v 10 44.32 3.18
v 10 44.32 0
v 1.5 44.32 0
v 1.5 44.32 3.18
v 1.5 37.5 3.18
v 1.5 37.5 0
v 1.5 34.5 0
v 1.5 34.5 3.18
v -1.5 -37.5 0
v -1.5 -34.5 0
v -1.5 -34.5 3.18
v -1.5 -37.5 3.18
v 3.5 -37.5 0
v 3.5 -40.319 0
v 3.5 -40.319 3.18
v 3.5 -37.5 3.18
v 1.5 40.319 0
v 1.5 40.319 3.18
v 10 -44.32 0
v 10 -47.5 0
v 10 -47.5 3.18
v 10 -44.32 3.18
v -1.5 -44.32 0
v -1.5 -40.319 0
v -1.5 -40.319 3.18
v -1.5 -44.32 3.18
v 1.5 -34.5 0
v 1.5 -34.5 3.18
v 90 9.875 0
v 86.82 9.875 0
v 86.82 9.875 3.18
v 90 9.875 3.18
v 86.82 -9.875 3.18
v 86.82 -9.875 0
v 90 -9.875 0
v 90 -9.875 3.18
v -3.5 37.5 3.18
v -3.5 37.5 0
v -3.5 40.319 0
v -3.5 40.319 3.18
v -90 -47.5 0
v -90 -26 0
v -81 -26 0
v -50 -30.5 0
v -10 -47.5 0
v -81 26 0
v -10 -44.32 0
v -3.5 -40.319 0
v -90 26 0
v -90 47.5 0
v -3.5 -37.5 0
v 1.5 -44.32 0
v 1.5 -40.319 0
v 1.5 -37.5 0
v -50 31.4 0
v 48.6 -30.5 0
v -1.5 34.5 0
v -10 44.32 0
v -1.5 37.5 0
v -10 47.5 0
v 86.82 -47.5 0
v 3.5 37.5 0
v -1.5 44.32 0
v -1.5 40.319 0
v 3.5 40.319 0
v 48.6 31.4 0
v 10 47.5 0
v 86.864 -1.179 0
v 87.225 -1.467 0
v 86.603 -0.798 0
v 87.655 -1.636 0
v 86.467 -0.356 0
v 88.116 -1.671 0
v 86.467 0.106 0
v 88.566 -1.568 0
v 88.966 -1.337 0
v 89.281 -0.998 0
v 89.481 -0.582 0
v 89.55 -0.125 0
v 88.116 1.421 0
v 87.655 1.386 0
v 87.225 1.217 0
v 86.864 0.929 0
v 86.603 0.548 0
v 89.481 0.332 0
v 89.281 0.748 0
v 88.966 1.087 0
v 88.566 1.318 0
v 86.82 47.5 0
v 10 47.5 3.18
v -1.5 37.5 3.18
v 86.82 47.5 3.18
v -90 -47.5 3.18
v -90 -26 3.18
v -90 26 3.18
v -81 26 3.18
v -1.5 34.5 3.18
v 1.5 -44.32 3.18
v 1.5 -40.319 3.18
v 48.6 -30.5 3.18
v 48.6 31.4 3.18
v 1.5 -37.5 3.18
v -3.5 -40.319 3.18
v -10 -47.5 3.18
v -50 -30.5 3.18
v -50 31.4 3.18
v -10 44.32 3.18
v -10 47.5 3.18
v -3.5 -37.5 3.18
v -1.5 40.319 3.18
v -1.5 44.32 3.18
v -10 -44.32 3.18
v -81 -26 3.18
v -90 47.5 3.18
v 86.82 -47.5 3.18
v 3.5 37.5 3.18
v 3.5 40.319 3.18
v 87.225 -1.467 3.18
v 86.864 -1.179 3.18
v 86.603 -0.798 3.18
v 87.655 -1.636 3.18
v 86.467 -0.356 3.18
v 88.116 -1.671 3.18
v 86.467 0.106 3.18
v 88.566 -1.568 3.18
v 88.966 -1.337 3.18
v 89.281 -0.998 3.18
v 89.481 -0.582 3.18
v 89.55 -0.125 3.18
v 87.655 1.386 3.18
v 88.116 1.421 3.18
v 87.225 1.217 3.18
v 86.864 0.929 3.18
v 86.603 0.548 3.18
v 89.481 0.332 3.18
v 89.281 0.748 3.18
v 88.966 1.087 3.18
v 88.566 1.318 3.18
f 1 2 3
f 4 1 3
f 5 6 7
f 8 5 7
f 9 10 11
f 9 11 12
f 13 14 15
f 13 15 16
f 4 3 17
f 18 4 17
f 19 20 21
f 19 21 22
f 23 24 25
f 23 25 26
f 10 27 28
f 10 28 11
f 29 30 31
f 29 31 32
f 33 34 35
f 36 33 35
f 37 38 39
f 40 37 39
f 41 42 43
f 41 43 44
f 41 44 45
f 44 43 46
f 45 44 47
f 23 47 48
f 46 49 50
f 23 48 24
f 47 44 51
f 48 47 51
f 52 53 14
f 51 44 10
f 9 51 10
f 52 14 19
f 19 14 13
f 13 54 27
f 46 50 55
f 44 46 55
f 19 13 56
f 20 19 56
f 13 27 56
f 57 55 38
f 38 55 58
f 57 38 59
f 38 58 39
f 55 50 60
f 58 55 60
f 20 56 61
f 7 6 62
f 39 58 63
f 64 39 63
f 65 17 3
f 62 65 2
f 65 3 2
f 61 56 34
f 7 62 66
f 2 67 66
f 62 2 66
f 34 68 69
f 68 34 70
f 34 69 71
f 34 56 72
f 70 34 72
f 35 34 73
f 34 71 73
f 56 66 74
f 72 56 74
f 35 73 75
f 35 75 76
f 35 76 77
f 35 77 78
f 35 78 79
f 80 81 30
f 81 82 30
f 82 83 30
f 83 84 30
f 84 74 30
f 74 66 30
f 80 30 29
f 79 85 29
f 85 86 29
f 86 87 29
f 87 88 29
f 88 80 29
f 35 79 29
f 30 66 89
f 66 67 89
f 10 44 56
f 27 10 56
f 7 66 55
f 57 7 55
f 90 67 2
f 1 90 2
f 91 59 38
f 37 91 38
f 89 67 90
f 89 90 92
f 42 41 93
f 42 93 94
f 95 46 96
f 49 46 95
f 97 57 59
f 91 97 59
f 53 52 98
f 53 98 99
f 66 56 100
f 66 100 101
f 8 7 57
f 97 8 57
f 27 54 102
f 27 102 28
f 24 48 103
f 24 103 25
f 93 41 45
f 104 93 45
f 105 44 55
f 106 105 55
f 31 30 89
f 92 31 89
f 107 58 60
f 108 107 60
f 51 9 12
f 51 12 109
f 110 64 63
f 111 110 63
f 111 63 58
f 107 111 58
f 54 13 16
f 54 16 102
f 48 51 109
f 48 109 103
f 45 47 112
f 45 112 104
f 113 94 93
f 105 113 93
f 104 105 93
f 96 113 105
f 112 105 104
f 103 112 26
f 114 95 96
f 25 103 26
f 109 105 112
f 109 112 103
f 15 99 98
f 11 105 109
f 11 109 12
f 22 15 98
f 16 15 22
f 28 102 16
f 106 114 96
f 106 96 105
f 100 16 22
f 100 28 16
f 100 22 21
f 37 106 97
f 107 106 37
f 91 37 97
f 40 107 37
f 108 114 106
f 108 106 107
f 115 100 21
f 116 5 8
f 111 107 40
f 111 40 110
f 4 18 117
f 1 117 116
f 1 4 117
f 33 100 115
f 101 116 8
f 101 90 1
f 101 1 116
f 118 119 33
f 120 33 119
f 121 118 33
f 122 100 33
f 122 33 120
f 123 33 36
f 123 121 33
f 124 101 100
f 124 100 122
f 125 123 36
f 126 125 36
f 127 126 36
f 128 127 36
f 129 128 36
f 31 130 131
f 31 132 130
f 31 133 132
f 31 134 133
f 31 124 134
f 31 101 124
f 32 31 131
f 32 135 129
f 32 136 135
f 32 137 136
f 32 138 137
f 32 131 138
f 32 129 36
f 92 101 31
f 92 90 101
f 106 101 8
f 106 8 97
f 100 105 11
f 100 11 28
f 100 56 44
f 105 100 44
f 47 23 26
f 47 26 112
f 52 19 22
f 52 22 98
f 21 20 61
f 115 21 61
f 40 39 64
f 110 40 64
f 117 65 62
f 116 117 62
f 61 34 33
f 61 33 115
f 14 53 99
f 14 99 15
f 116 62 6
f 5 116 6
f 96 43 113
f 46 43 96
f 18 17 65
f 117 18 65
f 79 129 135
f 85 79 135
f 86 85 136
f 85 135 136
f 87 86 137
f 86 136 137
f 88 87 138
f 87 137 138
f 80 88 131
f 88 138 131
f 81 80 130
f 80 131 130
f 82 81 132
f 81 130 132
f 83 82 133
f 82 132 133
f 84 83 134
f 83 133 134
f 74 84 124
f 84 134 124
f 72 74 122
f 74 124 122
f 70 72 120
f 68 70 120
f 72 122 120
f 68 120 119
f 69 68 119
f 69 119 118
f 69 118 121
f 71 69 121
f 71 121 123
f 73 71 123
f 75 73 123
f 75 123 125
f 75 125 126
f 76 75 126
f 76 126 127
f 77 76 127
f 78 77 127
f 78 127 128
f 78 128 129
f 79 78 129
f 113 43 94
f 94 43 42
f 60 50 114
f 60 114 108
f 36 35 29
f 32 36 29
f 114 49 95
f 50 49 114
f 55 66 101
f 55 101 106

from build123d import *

# Parameters (mm, degrees)
SKETCH1_W               = 180
SKETCH1_H               = 95
BOSS_EXTRUDE1_DEPTH     = 3.18
CUT_EXTRUDE1_START      = -4.18
SKETCH2_W               = 3.18
SKETCH2_H               = 37.625
CUT_EXTRUDE1_DEPTH      = 5.18
SKETCH3_R               = 1.55
CUT_EXTRUDE2_DEPTH      = 1
CUT_EXTRUDE2_DEPTH_BACK = 4.18
CUT_EXTRUDE3_START      = -4.18
CUT_EXTRUDE3_DEPTH      = 5.18
SKETCH7_W               = 98.6
SKETCH7_H               = 61.9
CUT_EXTRUDE6_DEPTH      = 1
CUT_EXTRUDE6_DEPTH_BACK = 4.18
SKETCH8_W               = 9
SKETCH8_H               = 52
CUT_EXTRUDE7_DEPTH      = 1
CUT_EXTRUDE7_DEPTH_BACK = 4.18


with BuildPart() as part:
    # Sketch1 → Boss-Extrude1 (new body)
    with BuildSketch(Plane.XY):
        Rectangle(SKETCH1_W, SKETCH1_H)
    extrude(amount=BOSS_EXTRUDE1_DEPTH)

    # Sketch2 → Cut-Extrude1 (cut)
    with BuildSketch(Plane.XY.offset(3.18).offset(CUT_EXTRUDE1_START)):
        with Locations((88.41, 28.6875)):
            Rectangle(SKETCH2_W, SKETCH2_H)
    cut_extrude1 = extrude(amount=CUT_EXTRUDE1_DEPTH, mode=Mode.SUBTRACT)

    # Mirror1: Cut-Extrude1 across plane
    add(cut_extrude1.mirror(Plane.ZX), mode=Mode.SUBTRACT)

    # Sketch3 → Cut-Extrude2 (cut, two sides)
    with BuildSketch(Plane.XY.offset(3.18)) as cut_extrude2_sk:
        with Locations((88, -0.125)):
            Circle(SKETCH3_R)
    extrude(amount=CUT_EXTRUDE2_DEPTH, mode=Mode.SUBTRACT)
    extrude(cut_extrude2_sk.sketch, amount=-CUT_EXTRUDE2_DEPTH_BACK, mode=Mode.SUBTRACT)

    # Sketch4 → Cut-Extrude3 (cut)
    with BuildSketch(Plane.XY.offset(3.18).offset(CUT_EXTRUDE3_START)):
        Polygon((-10, -47.5), (10, -47.5), (10, -44.32), (1.5, -44.32), (1.5, -40.318812073), (3.5, -40.318812073), (3.5, -37.5), (1.5, -37.5), (1.5, -34.5), (-1.5, -34.5), (-1.5, -37.5), (-3.5, -37.5), (-3.5, -40.318812073), (-1.5, -40.318812073), (-1.5, -44.32), (-10, -44.32), align=None)
    cut_extrude3 = extrude(amount=CUT_EXTRUDE3_DEPTH, mode=Mode.SUBTRACT)

    # Mirror2: Cut-Extrude3 across plane
    add(cut_extrude3.mirror(Plane.ZX), mode=Mode.SUBTRACT)

    # Sketch7 → Cut-Extrude6 (cut, two sides)
    with BuildSketch(Plane(origin=(0, 0, 0), x_dir=(-1, 0, 0), z_dir=(0, 0, -1))) as cut_extrude6_sk:
        with Locations((0.7, 0.45)):
            Rectangle(SKETCH7_W, SKETCH7_H)
    extrude(amount=CUT_EXTRUDE6_DEPTH, mode=Mode.SUBTRACT)
    extrude(cut_extrude6_sk.sketch, amount=-CUT_EXTRUDE6_DEPTH_BACK, mode=Mode.SUBTRACT)

    # Sketch8 → Cut-Extrude7 (cut, two sides)
    with BuildSketch(Plane(origin=(0, 0, 0), x_dir=(-1, 0, 0), z_dir=(0, 0, -1))) as cut_extrude7_sk:
        with Locations((85.5, 0)):
            Rectangle(SKETCH8_W, SKETCH8_H)
    extrude(amount=CUT_EXTRUDE7_DEPTH, mode=Mode.SUBTRACT)
    extrude(cut_extrude7_sk.sketch, amount=-CUT_EXTRUDE7_DEPTH_BACK, mode=Mode.SUBTRACT)


solid = part.part
